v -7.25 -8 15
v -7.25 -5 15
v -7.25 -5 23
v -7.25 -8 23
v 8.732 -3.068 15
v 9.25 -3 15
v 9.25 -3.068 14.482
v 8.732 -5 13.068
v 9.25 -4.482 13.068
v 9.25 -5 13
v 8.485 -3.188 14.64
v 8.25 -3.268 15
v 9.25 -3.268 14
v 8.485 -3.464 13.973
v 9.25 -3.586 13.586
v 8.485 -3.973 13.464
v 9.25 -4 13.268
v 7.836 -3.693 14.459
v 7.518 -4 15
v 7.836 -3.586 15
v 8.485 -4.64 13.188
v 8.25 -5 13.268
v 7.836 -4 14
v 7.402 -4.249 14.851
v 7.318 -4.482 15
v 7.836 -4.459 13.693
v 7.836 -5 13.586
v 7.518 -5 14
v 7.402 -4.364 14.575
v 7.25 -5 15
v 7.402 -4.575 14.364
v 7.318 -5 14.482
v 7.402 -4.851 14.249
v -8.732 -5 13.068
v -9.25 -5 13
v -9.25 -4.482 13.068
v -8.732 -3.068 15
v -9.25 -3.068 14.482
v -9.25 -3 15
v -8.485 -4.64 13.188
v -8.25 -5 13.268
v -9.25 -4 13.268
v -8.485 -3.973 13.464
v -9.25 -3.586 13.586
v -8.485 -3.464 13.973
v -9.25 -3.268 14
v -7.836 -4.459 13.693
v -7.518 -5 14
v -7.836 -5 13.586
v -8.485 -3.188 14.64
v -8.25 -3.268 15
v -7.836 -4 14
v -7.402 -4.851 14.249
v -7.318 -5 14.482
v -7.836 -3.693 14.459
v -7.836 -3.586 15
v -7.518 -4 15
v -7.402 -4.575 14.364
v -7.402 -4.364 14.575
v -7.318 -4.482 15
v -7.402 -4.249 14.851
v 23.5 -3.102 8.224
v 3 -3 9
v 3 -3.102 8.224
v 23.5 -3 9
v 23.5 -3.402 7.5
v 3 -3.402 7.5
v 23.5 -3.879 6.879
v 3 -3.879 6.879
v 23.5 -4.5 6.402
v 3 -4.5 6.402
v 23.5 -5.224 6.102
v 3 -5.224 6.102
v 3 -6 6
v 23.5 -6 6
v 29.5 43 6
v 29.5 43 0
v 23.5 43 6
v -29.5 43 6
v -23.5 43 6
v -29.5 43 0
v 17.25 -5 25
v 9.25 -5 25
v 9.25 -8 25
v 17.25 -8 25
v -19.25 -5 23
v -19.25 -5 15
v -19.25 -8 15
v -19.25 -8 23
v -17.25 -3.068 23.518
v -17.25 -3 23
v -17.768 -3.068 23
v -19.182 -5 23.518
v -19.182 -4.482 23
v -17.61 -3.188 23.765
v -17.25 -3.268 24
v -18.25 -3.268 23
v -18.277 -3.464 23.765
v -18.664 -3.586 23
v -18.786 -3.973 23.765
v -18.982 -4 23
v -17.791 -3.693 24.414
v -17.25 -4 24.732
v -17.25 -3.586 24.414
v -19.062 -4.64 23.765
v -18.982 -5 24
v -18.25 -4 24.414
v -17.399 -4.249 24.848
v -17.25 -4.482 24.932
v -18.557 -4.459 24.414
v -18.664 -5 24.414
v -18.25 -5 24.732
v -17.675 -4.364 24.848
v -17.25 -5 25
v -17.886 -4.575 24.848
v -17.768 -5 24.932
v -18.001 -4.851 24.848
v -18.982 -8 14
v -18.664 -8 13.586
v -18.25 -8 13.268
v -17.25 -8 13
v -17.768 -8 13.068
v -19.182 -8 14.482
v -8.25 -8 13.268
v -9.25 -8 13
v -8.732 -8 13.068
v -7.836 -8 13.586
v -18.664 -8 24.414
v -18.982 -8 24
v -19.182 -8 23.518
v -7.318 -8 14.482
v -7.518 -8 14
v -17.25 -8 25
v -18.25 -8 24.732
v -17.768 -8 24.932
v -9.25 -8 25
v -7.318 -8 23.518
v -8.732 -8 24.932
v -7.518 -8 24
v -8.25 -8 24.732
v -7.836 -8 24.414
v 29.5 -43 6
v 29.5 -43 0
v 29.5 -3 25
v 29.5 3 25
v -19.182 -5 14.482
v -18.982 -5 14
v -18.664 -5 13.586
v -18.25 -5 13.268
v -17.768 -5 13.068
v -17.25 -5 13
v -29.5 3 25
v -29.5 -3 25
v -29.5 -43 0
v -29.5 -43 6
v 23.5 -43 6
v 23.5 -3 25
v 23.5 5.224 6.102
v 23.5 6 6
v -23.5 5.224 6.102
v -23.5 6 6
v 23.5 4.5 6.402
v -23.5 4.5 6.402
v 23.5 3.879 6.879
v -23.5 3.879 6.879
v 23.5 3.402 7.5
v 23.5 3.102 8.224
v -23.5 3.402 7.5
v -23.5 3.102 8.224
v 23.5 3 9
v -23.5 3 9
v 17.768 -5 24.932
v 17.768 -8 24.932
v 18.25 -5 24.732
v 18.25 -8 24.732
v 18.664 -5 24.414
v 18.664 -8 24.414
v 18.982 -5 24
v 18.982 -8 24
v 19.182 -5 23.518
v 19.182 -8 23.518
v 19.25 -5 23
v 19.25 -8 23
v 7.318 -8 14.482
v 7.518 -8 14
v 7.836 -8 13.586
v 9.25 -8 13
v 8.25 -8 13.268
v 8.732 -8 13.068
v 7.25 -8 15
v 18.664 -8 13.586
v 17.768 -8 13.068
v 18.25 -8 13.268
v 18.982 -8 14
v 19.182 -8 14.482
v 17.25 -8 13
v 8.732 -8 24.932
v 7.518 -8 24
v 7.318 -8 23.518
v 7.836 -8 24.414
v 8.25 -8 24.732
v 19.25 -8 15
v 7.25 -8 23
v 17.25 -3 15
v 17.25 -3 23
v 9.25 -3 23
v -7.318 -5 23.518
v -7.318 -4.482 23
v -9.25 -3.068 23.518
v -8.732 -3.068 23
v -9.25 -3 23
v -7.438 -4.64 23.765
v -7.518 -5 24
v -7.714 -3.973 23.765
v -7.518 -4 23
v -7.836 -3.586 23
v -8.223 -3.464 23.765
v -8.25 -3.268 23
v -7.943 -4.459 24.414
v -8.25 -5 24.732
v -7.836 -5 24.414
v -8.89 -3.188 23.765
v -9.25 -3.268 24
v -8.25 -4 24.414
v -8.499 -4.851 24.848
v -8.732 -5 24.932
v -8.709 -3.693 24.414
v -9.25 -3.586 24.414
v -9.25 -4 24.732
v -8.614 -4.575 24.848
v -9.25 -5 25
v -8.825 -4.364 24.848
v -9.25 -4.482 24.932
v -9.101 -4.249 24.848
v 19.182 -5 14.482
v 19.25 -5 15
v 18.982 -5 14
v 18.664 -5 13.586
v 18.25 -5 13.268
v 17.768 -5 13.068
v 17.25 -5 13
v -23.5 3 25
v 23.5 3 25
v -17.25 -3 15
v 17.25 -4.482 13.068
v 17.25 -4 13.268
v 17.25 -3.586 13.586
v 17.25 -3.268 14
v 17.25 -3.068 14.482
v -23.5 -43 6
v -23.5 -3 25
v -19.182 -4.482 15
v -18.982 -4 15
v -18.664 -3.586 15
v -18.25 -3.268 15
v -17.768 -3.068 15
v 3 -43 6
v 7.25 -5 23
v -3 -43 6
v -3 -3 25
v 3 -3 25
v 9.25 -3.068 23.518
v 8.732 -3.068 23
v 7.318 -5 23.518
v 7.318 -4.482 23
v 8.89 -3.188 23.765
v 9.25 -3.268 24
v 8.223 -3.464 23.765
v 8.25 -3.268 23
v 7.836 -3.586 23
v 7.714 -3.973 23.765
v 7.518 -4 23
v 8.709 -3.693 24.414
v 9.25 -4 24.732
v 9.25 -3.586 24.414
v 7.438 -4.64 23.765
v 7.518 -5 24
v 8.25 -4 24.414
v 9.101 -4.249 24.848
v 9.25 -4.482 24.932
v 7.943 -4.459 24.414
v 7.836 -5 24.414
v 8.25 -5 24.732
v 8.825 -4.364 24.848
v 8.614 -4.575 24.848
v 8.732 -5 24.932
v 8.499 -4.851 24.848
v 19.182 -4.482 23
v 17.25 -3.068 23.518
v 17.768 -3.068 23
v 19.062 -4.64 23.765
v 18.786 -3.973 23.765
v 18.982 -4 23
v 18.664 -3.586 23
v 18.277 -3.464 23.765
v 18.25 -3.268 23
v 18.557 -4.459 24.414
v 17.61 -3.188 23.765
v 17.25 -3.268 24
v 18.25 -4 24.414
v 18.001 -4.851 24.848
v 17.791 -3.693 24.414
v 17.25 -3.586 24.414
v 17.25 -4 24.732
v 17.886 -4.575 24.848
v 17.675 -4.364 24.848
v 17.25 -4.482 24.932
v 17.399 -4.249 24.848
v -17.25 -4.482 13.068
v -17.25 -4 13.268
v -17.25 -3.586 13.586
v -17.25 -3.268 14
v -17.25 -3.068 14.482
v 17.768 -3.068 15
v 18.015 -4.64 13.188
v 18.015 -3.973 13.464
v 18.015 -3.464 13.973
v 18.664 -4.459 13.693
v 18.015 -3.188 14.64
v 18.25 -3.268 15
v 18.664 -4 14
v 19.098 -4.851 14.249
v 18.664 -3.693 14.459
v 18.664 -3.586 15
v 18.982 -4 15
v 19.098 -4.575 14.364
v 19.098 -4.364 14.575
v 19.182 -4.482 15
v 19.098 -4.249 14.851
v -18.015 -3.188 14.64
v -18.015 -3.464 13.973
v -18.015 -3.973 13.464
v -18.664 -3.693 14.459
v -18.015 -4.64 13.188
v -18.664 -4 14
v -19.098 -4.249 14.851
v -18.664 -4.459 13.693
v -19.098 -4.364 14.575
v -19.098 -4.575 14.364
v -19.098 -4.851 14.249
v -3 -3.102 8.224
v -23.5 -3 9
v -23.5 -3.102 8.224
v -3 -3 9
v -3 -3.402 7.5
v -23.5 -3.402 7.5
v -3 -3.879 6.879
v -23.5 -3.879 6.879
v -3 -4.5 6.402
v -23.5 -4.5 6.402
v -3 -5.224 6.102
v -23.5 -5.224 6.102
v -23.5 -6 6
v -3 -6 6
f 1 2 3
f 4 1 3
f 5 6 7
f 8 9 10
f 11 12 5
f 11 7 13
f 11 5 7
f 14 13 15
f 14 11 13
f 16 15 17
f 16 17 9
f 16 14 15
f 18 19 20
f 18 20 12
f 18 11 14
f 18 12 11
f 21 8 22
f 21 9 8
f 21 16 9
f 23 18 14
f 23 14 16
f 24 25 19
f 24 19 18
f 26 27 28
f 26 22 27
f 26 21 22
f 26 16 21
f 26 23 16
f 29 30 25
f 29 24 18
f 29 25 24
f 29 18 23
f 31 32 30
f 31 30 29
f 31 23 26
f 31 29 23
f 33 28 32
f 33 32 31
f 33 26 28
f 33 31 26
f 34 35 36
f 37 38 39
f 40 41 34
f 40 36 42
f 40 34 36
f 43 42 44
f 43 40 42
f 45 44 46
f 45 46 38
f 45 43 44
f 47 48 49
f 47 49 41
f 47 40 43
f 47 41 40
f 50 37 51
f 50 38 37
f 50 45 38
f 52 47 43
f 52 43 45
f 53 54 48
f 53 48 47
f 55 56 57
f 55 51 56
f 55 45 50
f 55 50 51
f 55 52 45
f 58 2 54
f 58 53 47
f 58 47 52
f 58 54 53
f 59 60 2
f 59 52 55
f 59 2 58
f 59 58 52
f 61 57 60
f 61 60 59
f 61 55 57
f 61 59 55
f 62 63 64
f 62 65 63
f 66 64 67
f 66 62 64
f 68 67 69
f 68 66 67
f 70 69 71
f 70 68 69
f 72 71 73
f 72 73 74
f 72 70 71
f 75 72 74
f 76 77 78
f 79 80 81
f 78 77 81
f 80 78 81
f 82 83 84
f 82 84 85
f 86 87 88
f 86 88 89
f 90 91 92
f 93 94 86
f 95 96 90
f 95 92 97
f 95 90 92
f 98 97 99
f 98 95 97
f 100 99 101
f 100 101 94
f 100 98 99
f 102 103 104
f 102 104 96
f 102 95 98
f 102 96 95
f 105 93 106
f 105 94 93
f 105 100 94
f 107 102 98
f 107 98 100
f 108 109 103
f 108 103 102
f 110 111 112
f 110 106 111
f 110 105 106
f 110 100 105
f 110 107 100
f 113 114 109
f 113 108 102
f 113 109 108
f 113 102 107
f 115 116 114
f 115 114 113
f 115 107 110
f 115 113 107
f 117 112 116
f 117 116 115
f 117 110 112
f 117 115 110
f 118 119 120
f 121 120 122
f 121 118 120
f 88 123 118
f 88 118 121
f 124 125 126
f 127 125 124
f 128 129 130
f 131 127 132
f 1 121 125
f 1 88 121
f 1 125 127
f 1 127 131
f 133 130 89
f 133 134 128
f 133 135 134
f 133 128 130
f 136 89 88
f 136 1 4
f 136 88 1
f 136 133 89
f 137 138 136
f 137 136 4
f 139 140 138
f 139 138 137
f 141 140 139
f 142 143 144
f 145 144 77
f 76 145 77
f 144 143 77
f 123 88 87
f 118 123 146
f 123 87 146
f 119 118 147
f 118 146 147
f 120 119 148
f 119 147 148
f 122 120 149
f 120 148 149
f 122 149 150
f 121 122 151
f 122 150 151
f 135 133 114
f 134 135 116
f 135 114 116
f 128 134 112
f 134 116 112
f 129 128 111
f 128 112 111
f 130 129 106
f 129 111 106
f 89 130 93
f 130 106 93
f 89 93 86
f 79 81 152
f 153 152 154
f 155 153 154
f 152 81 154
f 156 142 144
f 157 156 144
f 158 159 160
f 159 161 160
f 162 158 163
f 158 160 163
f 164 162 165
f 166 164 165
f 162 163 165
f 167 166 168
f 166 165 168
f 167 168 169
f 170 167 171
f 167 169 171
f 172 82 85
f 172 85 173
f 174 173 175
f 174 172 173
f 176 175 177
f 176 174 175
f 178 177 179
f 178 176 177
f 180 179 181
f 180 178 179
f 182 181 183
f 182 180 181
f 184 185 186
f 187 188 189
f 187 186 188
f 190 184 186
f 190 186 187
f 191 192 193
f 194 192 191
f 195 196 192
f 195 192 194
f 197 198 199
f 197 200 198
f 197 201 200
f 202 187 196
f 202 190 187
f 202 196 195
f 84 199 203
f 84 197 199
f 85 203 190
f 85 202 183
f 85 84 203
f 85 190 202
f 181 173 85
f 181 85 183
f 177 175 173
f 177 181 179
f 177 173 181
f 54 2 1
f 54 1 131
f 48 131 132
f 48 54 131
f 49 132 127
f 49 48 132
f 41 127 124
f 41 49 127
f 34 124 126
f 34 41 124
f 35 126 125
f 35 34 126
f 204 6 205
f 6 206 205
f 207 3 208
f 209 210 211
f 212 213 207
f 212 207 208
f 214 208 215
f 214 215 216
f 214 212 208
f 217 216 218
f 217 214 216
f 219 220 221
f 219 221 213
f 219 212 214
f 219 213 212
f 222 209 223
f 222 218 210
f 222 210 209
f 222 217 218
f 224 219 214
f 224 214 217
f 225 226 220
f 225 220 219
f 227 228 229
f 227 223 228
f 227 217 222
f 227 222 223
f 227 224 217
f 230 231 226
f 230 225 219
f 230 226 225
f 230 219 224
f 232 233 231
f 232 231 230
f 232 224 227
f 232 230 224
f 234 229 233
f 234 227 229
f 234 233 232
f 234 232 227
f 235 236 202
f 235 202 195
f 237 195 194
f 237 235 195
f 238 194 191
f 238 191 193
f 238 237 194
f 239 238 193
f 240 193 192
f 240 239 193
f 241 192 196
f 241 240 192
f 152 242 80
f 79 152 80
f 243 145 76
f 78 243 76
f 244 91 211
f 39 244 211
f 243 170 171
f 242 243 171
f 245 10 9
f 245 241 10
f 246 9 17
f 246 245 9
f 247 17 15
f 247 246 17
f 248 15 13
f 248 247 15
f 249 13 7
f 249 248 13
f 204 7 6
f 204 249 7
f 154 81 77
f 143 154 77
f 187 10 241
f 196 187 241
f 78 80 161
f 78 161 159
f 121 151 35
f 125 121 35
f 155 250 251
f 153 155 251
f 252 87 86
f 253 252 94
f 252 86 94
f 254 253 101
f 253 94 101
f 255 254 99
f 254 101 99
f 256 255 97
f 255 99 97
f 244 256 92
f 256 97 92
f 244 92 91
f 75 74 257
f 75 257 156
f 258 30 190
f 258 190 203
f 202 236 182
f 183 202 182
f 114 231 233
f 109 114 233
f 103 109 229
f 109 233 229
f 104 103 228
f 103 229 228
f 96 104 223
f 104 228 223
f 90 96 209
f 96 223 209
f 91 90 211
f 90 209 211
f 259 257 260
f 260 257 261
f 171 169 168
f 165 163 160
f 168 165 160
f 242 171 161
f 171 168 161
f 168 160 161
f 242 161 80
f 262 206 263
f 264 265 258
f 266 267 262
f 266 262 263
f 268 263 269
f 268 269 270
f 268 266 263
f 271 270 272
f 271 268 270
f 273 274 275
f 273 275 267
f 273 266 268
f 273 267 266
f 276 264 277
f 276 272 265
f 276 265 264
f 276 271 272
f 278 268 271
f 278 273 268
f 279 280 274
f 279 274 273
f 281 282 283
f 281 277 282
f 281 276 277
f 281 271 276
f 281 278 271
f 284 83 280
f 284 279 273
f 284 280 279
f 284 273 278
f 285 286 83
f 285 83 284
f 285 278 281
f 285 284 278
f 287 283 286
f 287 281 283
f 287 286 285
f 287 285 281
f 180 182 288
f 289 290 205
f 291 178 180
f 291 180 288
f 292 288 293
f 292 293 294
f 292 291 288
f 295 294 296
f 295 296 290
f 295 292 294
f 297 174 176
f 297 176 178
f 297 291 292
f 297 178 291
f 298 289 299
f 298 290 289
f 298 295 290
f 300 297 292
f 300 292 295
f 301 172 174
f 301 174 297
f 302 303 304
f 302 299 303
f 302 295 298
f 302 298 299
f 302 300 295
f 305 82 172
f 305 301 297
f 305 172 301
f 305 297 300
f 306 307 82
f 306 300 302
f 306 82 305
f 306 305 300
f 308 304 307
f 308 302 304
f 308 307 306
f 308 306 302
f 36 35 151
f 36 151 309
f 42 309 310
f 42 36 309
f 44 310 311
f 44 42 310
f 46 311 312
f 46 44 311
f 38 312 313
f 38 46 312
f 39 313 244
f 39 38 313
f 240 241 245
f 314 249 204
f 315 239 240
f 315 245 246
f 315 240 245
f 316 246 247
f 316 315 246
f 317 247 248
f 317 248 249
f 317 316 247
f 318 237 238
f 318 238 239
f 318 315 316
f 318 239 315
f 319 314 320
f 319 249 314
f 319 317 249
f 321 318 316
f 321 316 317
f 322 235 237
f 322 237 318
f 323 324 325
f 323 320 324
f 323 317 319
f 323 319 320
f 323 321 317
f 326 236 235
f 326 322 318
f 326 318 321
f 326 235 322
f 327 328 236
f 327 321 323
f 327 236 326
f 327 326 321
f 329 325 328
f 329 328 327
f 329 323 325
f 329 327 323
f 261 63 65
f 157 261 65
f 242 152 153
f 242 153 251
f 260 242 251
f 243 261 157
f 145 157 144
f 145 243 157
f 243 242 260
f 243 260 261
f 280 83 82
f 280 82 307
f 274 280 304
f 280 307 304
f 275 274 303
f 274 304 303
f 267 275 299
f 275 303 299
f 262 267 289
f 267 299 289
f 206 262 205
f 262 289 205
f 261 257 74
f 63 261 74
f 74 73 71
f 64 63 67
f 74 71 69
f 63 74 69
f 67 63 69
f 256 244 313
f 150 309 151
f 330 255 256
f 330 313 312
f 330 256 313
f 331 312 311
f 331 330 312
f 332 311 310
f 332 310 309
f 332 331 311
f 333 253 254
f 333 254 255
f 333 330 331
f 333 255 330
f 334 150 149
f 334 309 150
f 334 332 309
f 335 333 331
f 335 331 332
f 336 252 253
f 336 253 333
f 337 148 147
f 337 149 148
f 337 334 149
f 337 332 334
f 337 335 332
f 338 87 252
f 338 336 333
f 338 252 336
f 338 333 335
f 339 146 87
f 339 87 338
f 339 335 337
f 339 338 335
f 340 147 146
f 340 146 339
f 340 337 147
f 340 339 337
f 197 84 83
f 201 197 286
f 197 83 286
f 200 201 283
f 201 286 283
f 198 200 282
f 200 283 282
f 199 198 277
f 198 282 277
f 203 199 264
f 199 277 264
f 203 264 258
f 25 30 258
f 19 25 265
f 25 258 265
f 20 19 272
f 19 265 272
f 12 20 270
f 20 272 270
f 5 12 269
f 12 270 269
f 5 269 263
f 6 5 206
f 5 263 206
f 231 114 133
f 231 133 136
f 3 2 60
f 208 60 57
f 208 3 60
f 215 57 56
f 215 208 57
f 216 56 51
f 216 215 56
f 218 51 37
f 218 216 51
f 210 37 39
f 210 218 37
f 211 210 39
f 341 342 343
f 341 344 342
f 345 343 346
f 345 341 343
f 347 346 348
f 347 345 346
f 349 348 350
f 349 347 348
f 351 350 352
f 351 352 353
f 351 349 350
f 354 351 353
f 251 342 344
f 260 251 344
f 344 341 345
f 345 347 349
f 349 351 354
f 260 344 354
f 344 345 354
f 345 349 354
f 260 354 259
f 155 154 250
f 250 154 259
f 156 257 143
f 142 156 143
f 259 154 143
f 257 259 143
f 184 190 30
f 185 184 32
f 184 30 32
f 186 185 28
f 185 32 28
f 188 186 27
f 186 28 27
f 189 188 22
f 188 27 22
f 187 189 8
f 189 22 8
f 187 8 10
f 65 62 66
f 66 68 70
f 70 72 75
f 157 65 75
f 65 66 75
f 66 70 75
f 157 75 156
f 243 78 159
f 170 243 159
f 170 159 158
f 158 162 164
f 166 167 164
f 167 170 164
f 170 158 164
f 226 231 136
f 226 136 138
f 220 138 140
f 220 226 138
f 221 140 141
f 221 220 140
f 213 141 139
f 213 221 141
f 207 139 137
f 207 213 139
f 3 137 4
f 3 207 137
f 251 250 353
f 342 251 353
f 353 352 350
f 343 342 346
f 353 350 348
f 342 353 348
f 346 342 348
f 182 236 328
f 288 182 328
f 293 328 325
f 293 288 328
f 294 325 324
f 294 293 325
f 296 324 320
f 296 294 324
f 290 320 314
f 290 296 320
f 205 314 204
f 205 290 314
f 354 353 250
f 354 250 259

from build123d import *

# Parameters (mm, degrees)
F0_W             = 59
F0_H             = 86
F1_DEPTH         = 6
F3_DEPTH         = 19
F5_DEPTH         = 59.001
F7_R             = 3
F6_W             = 12
F6_H             = 12
F8_DEPTH         = 5
F9_R             = 2
F10_T1_DEPTH     = 8
F10_S5_W         = 2
F10_S5_H         = 2
F10_T6_DEPTH     = 2
F10_S11_W        = 2
F10_S11_H        = 2
F10_T12_DEPTH    = 2
F10_S17_W        = 2
F10_S17_H        = 2
F10_T18_DEPTH    = 2
F10_S23_W        = 2
F10_S23_H        = 2
F10_T24_DEPTH    = 2
F10_S1_T1_DEPTH  = 8
F10_S1_S5_W      = 2
F10_S1_S5_H      = 2
F10_S1_T6_DEPTH  = 2
F10_S1_S11_W     = 2
F10_S1_S11_H     = 2
F10_S1_T12_DEPTH = 2
F10_S1_S17_W     = 2
F10_S1_S17_H     = 2
F10_S1_T18_DEPTH = 2
F10_S1_S23_W     = 2
F10_S1_S23_H     = 2
F10_S1_T24_DEPTH = 2


# Not quite as in the source:
# - a fillet or chamfer that OpenCascade refuses, or shapes differently, is made with other operations: its cross-section is extruded or revolved along the edge and cut away or added


with BuildPart() as f1:
    # F0 (on Top) → F1 (new body)
    with BuildSketch(Plane.XY):
        Rectangle(F0_W, F0_H)
    extrude(amount=F1_DEPTH)

    # F2 (on face) → F3 (join)
    with BuildSketch(Plane.XY.offset(6)):
        Polygon((-23.5, 43), (-29.5, 43), (-29.5, -43), (-23.5, -43), (-23.5, -3), (-3, -3), (-3, -43), (3, -43), (3, -3), (23.5, -3), (23.5, -43), (29.5, -43), (29.5, 43), (23.5, 43), (23.5, 3), (-23.5, 3), align=None)
    extrude(amount=F3_DEPTH)

    # F4 (on face) → F5 (cut, through all)
    with BuildSketch(Plane.YZ.offset(29.5)):
        Polygon((-43, 25), (-43, 6), (-3, 25), align=None)
        Polygon((43, 25), (3, 25), (43, 6), align=None)
    extrude(amount=-F5_DEPTH, mode=Mode.SUBTRACT)

    # F7
    f7_edges = [f1.edges().sort_by_distance(p)[0] for p in [
        (-13.25, -3, 6),
        (13.25, -3, 6),
        (0, 3, 6),
    ]]
    fillet(f7_edges, radius=F7_R)


with BuildPart() as f8:
    # F6 (on face) → F8 (new body)
    with BuildSketch(Plane.XZ.offset(3)):
        with Locations((-13.25, 19)):
            Rectangle(F6_W, F6_H)
        with Locations((13.25, 19)):
            Rectangle(F6_W, F6_H)
    extrude(amount=F8_DEPTH)

    # F9
    f9_edges = [f8.edges().sort_by_distance(p)[0] for p in [
        (-7.25, -3, 19),
        (-13.25, -3, 25),
        (-19.25, -3, 19),
        (-13.25, -3, 13),
        (13.25, -3, 13),
        (7.25, -3, 19),
        (19.25, -3, 19),
        (13.25, -3, 25),
    ]]
    fillet(f9_edges, radius=F9_R)

    # F10: fillet of radius 2 on 4 edges, made by hand

    # F10_s2 → F10_t1 (cut)
    with BuildSketch(Plane.XZ.offset(5)):
        with BuildLine():
            ThreePointArc((-7.25, 15), (-7.8357864376, 13.5857864376), (-9.25, 13))
            Line((-9.25, 13), (-7.25, 13))
            Line((-7.25, 13), (-7.25, 15))
        make_face()
        with BuildLine():
            ThreePointArc((-19.25, 15), (-18.6642135624, 13.5857864376), (-17.25, 13))
            Line((-17.25, 13), (-19.25, 13))
            Line((-19.25, 13), (-19.25, 15))
        make_face()
        with BuildLine():
            ThreePointArc((-9.25, 25), (-7.8357864376, 24.4142135624), (-7.25, 23))
            Line((-7.25, 23), (-7.25, 25))
            Line((-7.25, 25), (-9.25, 25))
        make_face()
        with BuildLine():
            ThreePointArc((-17.25, 25), (-18.6642135624, 24.4142135624), (-19.25, 23))
            Line((-19.25, 23), (-19.25, 25))
            Line((-19.25, 25), (-17.25, 25))
        make_face()
    extrude(amount=F10_T1_DEPTH, mode=Mode.SUBTRACT)


with BuildPart() as f10_tool4:
    # F10_s5 → F10_t6 (new body)
    with BuildSketch(Plane.XY.offset(23)):
        with Locations((-18.25, -4)):
            Rectangle(F10_S5_W, F10_S5_H)
    extrude(amount=F10_T6_DEPTH)

    # F10_s7 → F10_t8 (revolve, cut)
    with BuildSketch(Plane(origin=(-17.25, -5, 23), x_dir=(0.7071067812, -0.7071067812, 0), z_dir=(-0.7071067812, -0.7071067812, 0))):
        with BuildLine():
            ThreePointArc((0, -2), (2, 0), (0, 2))
            Line((0, 2), (0, -2))
        make_face()
    revolve(axis=Axis((-17.25, -5, 23), (0, 0, 1)), mode=Mode.SUBTRACT)


with BuildPart() as f8_1:
    add(f8.part)

    # F10_t3: cut F10_tool4
    add(f10_tool4.part, mode=Mode.SUBTRACT)


with BuildPart() as f10_tool10:
    # F10_s11 → F10_t12 (new body)
    with BuildSketch(Plane.XY.offset(23)):
        with Locations((-8.25, -4)):
            Rectangle(F10_S11_W, F10_S11_H)
    extrude(amount=F10_T12_DEPTH)

    # F10_s13 → F10_t14 (revolve, cut)
    with BuildSketch(Plane(origin=(-9.25, -5, 23), x_dir=(-0.7071067812, -0.7071067812, 0), z_dir=(-0.7071067812, 0.7071067812, 0))):
        with BuildLine():
            ThreePointArc((0, -2), (2, 0), (0, 2))
            Line((0, 2), (0, -2))
        make_face()
    revolve(axis=Axis((-9.25, -5, 23), (0, 0, 1)), mode=Mode.SUBTRACT)


with BuildPart() as f8_2:
    add(f8_1.part)

    # F10_t9: cut F10_tool10
    add(f10_tool10.part, mode=Mode.SUBTRACT)


with BuildPart() as f10_tool16:
    # F10_s17 → F10_t18 (new body)
    with BuildSketch(Plane.YZ.offset(-17.25)):
        with Locations((-4, 14)):
            Rectangle(F10_S17_W, F10_S17_H)
    extrude(amount=-F10_T18_DEPTH)

    # F10_s19 → F10_t20 (revolve, cut)
    with BuildSketch(Plane(origin=(-17.25, -5, 15), x_dir=(0, -0.7071067812, 0.7071067812), z_dir=(0, -0.7071067812, -0.7071067812))):
        with BuildLine():
            ThreePointArc((0, -2), (2, 0), (0, 2))
            Line((0, 2), (0, -2))
        make_face()
    revolve(axis=Axis((-17.25, -5, 15), (-1, 0, 0)), mode=Mode.SUBTRACT)


with BuildPart() as f8_3:
    add(f8_2.part)

    # F10_t15: cut F10_tool16
    add(f10_tool16.part, mode=Mode.SUBTRACT)


with BuildPart() as f10_tool22:
    # F10_s23 → F10_t24 (new body)
    with BuildSketch(Plane.YZ.offset(-9.25)):
        with Locations((-4, 14)):
            Rectangle(F10_S23_W, F10_S23_H)
    extrude(amount=F10_T24_DEPTH)

    # F10_s25 → F10_t26 (revolve, cut)
    with BuildSketch(Plane(origin=(-9.25, -5, 15), x_dir=(0, -0.7071067812, 0.7071067812), z_dir=(0, 0.7071067812, 0.7071067812))):
        with BuildLine():
            ThreePointArc((0, -2), (2, 0), (0, 2))
            Line((0, 2), (0, -2))
        make_face()
    revolve(axis=Axis((-9.25, -5, 15), (1, 0, 0)), mode=Mode.SUBTRACT)


with BuildPart() as f8_4:
    add(f8_3.part)

    # F10_t21: cut F10_tool22
    add(f10_tool22.part, mode=Mode.SUBTRACT)

    # F10#s1: fillet of radius 2 on 4 edges, made by hand

    # F10_s1_s2 → F10_s1_t1 (cut)
    with BuildSketch(Plane.XZ.offset(5)):
        with BuildLine():
            ThreePointArc((19.25, 15), (18.6642135624, 13.5857864376), (17.25, 13))
            Line((17.25, 13), (19.25, 13))
            Line((19.25, 13), (19.25, 15))
        make_face()
        with BuildLine():
            ThreePointArc((17.25, 25), (18.6642135624, 24.4142135624), (19.25, 23))
            Line((19.25, 23), (19.25, 25))
            Line((19.25, 25), (17.25, 25))
        make_face()
        with BuildLine():
            ThreePointArc((7.25, 15), (7.8357864376, 13.5857864376), (9.25, 13))
            Line((9.25, 13), (7.25, 13))
            Line((7.25, 13), (7.25, 15))
        make_face()
        with BuildLine():
            ThreePointArc((9.25, 25), (7.8357864376, 24.4142135624), (7.25, 23))
            Line((7.25, 23), (7.25, 25))
            Line((7.25, 25), (9.25, 25))
        make_face()
    extrude(amount=F10_S1_T1_DEPTH, mode=Mode.SUBTRACT)


with BuildPart() as f10_s1_tool4:
    # F10_s1_s5 → F10_s1_t6 (new body)
    with BuildSketch(Plane.XY.offset(23)):
        with Locations((8.25, -4)):
            Rectangle(F10_S1_S5_W, F10_S1_S5_H)
    extrude(amount=F10_S1_T6_DEPTH)

    # F10_s1_s7 → F10_s1_t8 (revolve, cut)
    with BuildSketch(Plane(origin=(9.25, -5, 23), x_dir=(0.7071067812, -0.7071067812, 0), z_dir=(-0.7071067812, -0.7071067812, 0))):
        with BuildLine():
            ThreePointArc((0, -2), (2, 0), (0, 2))
            Line((0, 2), (0, -2))
        make_face()
    revolve(axis=Axis((9.25, -5, 23), (0, 0, 1)), mode=Mode.SUBTRACT)


with BuildPart() as f8_5:
    add(f8_4.part)

    # F10_s1_t3: cut F10_s1_tool4
    add(f10_s1_tool4.part, mode=Mode.SUBTRACT)


with BuildPart() as f10_s1_tool10:
    # F10_s1_s11 → F10_s1_t12 (new body)
    with BuildSketch(Plane.YZ.offset(9.25)):
        with Locations((-4, 14)):
            Rectangle(F10_S1_S11_W, F10_S1_S11_H)
    extrude(amount=-F10_S1_T12_DEPTH)

    # F10_s1_s13 → F10_s1_t14 (revolve, cut)
    with BuildSketch(Plane(origin=(9.25, -5, 15), x_dir=(0, -0.7071067812, 0.7071067812), z_dir=(0, -0.7071067812, -0.7071067812))):
        with BuildLine():
            ThreePointArc((0, -2), (2, 0), (0, 2))
            Line((0, 2), (0, -2))
        make_face()
    revolve(axis=Axis((9.25, -5, 15), (-1, 0, 0)), mode=Mode.SUBTRACT)


with BuildPart() as f8_6:
    add(f8_5.part)

    # F10_s1_t9: cut F10_s1_tool10
    add(f10_s1_tool10.part, mode=Mode.SUBTRACT)


with BuildPart() as f10_s1_tool16:
    # F10_s1_s17 → F10_s1_t18 (new body)
    with BuildSketch(Plane.XY.offset(23)):
        with Locations((18.25, -4)):
            Rectangle(F10_S1_S17_W, F10_S1_S17_H)
    extrude(amount=F10_S1_T18_DEPTH)

    # F10_s1_s19 → F10_s1_t20 (revolve, cut)
    with BuildSketch(Plane(origin=(17.25, -5, 23), x_dir=(-0.7071067812, -0.7071067812, 0), z_dir=(-0.7071067812, 0.7071067812, 0))):
        with BuildLine():
            ThreePointArc((0, -2), (2, 0), (0, 2))
            Line((0, 2), (0, -2))
        make_face()
    revolve(axis=Axis((17.25, -5, 23), (0, 0, 1)), mode=Mode.SUBTRACT)


with BuildPart() as f8_7:
    add(f8_6.part)

    # F10_s1_t15: cut F10_s1_tool16
    add(f10_s1_tool16.part, mode=Mode.SUBTRACT)


with BuildPart() as f10_s1_tool22:
    # F10_s1_s23 → F10_s1_t24 (new body)
    with BuildSketch(Plane.YZ.offset(17.25)):
        with Locations((-4, 14)):
            Rectangle(F10_S1_S23_W, F10_S1_S23_H)
    extrude(amount=F10_S1_T24_DEPTH)

    # F10_s1_s25 → F10_s1_t26 (revolve, cut)
    with BuildSketch(Plane(origin=(17.25, -5, 15), x_dir=(0, -0.7071067812, 0.7071067812), z_dir=(0, 0.7071067812, 0.7071067812))):
        with BuildLine():
            ThreePointArc((0, -2), (2, 0), (0, 2))
            Line((0, 2), (0, -2))
        make_face()
    revolve(axis=Axis((17.25, -5, 15), (1, 0, 0)), mode=Mode.SUBTRACT)


with BuildPart() as f8_8:
    add(f8_7.part)

    # F10_s1_t21: cut F10_s1_tool22
    add(f10_s1_tool22.part, mode=Mode.SUBTRACT)


solid = Compound([f1.part, f8_8.part])
